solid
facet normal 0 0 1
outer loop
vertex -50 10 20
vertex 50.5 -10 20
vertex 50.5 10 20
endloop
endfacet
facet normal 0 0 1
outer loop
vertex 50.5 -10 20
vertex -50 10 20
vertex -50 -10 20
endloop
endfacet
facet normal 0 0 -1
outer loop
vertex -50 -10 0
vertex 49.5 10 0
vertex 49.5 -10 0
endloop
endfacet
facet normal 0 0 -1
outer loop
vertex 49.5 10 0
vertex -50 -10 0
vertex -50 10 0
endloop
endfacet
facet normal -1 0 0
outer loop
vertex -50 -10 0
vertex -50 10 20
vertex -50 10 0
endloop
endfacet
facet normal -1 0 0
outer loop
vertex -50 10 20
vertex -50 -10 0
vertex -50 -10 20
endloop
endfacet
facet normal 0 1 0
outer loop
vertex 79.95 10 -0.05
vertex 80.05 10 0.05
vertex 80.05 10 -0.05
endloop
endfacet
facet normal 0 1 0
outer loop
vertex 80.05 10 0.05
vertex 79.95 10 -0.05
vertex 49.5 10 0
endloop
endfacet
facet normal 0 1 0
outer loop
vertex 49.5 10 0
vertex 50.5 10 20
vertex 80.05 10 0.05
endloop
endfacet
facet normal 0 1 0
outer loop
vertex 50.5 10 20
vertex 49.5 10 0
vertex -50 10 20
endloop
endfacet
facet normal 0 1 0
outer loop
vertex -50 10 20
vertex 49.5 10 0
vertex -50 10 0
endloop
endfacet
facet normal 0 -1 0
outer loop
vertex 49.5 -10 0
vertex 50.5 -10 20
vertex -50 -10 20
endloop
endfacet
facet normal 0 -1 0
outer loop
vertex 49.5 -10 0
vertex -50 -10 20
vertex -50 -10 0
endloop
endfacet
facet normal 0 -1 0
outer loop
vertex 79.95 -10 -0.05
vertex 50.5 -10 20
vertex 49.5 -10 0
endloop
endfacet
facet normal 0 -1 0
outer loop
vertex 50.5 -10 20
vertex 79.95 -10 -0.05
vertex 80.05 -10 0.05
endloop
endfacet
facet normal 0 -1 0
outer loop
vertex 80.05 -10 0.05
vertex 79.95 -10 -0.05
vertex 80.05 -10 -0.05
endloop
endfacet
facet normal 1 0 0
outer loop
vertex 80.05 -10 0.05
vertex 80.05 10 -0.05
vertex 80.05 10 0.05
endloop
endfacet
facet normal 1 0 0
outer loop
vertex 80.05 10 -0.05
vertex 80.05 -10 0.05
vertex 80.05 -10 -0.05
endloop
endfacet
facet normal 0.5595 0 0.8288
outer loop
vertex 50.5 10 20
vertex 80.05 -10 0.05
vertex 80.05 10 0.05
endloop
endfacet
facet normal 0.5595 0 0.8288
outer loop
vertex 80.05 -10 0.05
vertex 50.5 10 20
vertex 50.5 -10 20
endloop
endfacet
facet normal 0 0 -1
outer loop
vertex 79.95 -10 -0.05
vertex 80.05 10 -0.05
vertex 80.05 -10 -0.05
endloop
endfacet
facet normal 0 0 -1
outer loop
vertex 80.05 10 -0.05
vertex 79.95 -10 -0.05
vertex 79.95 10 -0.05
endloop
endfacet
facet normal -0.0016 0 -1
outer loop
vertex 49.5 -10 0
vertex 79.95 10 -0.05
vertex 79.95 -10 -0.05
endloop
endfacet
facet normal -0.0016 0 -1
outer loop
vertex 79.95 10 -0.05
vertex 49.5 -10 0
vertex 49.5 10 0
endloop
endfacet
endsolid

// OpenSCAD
//open source chissel

//Length of chissel handle
L=100; //[0:200]

// Length of tip
t= 30; //[0:100]

//Width of chissel handle
w=20; //[0:50]

//Height of chissel handle
h=20; //[0:20]

// Width of blade
b=20;// [0:50]

// Minimum printing step height
a=0.1; //

translate([0,0,w/2])

union(){
cube([L,h,w], center=true);
hull(){
translate([L/2,0,0])cube([1,h,w], center=true);
rotate([0,0,90])translate([0,-t-L/2,-w/2])cube([b,a,a], center=true);
}
}
